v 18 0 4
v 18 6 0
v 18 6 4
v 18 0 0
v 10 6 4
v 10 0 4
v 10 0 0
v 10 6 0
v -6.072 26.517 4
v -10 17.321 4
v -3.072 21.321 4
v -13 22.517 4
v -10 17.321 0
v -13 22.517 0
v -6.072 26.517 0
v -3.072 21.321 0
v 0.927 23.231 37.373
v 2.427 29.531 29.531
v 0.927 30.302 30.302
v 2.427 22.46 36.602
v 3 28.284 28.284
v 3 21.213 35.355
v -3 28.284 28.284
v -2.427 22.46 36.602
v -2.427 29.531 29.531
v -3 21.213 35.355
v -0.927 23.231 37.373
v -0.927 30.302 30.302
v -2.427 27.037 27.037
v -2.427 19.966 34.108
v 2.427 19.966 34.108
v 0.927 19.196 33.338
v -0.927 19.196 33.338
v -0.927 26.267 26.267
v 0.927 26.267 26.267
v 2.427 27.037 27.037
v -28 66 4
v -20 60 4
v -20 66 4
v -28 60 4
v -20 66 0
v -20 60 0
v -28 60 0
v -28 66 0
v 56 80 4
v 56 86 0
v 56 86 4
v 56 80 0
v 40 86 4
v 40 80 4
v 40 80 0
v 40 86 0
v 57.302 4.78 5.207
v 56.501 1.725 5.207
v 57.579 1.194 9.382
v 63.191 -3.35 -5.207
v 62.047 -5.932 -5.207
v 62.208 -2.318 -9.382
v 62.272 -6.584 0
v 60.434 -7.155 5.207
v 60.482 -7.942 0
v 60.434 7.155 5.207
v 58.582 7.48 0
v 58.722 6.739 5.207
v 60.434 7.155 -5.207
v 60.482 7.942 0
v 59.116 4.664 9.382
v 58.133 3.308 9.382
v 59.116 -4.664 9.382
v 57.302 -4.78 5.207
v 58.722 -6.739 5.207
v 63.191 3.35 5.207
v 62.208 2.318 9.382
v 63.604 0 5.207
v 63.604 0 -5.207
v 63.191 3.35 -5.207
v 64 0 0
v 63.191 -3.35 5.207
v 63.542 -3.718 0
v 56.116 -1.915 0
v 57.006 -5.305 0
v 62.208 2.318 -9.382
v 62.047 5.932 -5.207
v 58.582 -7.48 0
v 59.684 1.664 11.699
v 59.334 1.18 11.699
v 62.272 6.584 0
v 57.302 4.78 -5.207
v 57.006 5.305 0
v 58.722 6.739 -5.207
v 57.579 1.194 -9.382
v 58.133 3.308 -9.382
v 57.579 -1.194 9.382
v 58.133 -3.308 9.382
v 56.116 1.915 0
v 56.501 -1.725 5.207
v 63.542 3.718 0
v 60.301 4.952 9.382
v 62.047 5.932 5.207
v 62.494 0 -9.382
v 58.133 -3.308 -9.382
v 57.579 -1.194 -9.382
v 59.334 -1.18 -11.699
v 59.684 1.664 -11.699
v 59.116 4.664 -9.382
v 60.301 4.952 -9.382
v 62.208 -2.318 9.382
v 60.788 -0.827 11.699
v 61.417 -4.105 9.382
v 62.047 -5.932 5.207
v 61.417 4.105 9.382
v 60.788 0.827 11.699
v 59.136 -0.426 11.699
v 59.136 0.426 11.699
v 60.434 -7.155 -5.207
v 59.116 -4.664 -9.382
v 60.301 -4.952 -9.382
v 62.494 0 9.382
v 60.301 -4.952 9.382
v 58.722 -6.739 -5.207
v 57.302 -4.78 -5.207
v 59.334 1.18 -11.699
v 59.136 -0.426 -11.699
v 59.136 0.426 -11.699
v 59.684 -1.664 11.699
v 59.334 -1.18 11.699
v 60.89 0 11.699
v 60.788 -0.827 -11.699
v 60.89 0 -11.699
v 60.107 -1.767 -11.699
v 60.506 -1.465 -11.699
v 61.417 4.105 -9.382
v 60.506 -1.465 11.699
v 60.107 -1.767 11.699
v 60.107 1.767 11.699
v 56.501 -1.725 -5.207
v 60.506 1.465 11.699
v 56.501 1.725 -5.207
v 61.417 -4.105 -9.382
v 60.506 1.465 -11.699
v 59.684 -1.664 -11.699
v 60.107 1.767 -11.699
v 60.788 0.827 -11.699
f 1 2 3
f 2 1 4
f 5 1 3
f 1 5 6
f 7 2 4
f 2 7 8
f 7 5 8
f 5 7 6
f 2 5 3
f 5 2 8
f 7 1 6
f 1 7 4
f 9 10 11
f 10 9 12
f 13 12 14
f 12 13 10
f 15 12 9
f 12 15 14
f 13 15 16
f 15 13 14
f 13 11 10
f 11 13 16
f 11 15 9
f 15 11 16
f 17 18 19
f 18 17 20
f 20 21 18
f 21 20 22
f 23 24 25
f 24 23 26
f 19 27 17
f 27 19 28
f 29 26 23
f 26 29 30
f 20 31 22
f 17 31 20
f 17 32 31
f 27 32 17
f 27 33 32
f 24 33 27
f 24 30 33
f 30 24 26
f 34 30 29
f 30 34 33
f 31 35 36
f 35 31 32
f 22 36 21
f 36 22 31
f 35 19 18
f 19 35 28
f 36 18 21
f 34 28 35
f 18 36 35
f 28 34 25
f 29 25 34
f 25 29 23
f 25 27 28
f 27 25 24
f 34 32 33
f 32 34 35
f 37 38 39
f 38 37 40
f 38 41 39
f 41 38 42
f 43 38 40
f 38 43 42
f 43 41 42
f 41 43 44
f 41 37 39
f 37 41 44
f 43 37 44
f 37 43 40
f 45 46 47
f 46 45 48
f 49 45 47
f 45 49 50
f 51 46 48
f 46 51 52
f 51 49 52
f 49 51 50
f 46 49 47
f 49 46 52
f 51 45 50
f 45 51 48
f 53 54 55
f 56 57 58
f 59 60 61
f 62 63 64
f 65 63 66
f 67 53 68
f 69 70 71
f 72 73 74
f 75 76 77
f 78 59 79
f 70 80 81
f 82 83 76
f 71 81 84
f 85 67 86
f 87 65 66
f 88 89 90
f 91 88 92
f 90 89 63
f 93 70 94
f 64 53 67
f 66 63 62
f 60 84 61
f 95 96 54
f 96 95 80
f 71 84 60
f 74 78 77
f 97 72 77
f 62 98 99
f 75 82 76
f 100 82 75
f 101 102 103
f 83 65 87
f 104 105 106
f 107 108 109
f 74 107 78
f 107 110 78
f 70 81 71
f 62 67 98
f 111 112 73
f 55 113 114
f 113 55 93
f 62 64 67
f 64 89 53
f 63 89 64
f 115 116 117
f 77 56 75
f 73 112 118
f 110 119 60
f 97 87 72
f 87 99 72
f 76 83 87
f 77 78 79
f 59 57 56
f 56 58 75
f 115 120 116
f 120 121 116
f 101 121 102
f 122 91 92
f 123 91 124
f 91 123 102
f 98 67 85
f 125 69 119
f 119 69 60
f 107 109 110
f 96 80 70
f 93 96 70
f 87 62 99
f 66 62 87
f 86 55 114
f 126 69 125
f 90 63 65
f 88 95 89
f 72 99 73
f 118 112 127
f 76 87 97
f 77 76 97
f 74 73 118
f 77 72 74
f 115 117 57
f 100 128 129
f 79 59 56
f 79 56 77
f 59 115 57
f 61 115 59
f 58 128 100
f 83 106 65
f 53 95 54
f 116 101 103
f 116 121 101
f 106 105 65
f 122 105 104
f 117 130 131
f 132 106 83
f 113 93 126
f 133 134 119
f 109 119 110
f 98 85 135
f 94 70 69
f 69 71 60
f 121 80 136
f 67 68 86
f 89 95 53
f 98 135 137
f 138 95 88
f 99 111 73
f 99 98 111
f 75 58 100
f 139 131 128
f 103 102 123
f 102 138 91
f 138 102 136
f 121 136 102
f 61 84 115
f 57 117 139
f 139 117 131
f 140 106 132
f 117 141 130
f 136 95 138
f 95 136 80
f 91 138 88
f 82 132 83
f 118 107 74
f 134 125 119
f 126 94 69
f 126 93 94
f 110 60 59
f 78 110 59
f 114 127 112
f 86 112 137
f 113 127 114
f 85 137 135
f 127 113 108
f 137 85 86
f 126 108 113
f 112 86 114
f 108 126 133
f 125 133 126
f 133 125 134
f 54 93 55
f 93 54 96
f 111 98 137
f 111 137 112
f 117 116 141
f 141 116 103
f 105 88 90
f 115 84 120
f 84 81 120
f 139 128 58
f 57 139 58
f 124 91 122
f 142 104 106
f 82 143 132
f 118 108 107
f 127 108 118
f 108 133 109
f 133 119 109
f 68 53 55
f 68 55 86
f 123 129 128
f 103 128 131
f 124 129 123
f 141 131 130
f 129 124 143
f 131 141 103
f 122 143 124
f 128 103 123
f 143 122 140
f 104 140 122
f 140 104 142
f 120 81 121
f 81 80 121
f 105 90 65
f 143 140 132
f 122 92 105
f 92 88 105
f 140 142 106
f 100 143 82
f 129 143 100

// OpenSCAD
// rigid transforms must preserve analytic surfaces; non-uniform scale must not.
translate([10, 0, 0]) cube([8, 6, 4]);
rotate([0, 0, 30]) translate([0, 20, 0]) cube([8, 6, 4]);
rotate([45, 0, 0]) translate([0, 40, 0]) cylinder(h = 10, r = 3);
mirror([1, 0, 0]) translate([20, 60, 0]) cube([8, 6, 4]);
scale([2, 1, 1]) translate([20, 80, 0]) cube([8, 6, 4]);
translate([60, 0, 0]) scale([1, 2, 3]) sphere(r = 4);
